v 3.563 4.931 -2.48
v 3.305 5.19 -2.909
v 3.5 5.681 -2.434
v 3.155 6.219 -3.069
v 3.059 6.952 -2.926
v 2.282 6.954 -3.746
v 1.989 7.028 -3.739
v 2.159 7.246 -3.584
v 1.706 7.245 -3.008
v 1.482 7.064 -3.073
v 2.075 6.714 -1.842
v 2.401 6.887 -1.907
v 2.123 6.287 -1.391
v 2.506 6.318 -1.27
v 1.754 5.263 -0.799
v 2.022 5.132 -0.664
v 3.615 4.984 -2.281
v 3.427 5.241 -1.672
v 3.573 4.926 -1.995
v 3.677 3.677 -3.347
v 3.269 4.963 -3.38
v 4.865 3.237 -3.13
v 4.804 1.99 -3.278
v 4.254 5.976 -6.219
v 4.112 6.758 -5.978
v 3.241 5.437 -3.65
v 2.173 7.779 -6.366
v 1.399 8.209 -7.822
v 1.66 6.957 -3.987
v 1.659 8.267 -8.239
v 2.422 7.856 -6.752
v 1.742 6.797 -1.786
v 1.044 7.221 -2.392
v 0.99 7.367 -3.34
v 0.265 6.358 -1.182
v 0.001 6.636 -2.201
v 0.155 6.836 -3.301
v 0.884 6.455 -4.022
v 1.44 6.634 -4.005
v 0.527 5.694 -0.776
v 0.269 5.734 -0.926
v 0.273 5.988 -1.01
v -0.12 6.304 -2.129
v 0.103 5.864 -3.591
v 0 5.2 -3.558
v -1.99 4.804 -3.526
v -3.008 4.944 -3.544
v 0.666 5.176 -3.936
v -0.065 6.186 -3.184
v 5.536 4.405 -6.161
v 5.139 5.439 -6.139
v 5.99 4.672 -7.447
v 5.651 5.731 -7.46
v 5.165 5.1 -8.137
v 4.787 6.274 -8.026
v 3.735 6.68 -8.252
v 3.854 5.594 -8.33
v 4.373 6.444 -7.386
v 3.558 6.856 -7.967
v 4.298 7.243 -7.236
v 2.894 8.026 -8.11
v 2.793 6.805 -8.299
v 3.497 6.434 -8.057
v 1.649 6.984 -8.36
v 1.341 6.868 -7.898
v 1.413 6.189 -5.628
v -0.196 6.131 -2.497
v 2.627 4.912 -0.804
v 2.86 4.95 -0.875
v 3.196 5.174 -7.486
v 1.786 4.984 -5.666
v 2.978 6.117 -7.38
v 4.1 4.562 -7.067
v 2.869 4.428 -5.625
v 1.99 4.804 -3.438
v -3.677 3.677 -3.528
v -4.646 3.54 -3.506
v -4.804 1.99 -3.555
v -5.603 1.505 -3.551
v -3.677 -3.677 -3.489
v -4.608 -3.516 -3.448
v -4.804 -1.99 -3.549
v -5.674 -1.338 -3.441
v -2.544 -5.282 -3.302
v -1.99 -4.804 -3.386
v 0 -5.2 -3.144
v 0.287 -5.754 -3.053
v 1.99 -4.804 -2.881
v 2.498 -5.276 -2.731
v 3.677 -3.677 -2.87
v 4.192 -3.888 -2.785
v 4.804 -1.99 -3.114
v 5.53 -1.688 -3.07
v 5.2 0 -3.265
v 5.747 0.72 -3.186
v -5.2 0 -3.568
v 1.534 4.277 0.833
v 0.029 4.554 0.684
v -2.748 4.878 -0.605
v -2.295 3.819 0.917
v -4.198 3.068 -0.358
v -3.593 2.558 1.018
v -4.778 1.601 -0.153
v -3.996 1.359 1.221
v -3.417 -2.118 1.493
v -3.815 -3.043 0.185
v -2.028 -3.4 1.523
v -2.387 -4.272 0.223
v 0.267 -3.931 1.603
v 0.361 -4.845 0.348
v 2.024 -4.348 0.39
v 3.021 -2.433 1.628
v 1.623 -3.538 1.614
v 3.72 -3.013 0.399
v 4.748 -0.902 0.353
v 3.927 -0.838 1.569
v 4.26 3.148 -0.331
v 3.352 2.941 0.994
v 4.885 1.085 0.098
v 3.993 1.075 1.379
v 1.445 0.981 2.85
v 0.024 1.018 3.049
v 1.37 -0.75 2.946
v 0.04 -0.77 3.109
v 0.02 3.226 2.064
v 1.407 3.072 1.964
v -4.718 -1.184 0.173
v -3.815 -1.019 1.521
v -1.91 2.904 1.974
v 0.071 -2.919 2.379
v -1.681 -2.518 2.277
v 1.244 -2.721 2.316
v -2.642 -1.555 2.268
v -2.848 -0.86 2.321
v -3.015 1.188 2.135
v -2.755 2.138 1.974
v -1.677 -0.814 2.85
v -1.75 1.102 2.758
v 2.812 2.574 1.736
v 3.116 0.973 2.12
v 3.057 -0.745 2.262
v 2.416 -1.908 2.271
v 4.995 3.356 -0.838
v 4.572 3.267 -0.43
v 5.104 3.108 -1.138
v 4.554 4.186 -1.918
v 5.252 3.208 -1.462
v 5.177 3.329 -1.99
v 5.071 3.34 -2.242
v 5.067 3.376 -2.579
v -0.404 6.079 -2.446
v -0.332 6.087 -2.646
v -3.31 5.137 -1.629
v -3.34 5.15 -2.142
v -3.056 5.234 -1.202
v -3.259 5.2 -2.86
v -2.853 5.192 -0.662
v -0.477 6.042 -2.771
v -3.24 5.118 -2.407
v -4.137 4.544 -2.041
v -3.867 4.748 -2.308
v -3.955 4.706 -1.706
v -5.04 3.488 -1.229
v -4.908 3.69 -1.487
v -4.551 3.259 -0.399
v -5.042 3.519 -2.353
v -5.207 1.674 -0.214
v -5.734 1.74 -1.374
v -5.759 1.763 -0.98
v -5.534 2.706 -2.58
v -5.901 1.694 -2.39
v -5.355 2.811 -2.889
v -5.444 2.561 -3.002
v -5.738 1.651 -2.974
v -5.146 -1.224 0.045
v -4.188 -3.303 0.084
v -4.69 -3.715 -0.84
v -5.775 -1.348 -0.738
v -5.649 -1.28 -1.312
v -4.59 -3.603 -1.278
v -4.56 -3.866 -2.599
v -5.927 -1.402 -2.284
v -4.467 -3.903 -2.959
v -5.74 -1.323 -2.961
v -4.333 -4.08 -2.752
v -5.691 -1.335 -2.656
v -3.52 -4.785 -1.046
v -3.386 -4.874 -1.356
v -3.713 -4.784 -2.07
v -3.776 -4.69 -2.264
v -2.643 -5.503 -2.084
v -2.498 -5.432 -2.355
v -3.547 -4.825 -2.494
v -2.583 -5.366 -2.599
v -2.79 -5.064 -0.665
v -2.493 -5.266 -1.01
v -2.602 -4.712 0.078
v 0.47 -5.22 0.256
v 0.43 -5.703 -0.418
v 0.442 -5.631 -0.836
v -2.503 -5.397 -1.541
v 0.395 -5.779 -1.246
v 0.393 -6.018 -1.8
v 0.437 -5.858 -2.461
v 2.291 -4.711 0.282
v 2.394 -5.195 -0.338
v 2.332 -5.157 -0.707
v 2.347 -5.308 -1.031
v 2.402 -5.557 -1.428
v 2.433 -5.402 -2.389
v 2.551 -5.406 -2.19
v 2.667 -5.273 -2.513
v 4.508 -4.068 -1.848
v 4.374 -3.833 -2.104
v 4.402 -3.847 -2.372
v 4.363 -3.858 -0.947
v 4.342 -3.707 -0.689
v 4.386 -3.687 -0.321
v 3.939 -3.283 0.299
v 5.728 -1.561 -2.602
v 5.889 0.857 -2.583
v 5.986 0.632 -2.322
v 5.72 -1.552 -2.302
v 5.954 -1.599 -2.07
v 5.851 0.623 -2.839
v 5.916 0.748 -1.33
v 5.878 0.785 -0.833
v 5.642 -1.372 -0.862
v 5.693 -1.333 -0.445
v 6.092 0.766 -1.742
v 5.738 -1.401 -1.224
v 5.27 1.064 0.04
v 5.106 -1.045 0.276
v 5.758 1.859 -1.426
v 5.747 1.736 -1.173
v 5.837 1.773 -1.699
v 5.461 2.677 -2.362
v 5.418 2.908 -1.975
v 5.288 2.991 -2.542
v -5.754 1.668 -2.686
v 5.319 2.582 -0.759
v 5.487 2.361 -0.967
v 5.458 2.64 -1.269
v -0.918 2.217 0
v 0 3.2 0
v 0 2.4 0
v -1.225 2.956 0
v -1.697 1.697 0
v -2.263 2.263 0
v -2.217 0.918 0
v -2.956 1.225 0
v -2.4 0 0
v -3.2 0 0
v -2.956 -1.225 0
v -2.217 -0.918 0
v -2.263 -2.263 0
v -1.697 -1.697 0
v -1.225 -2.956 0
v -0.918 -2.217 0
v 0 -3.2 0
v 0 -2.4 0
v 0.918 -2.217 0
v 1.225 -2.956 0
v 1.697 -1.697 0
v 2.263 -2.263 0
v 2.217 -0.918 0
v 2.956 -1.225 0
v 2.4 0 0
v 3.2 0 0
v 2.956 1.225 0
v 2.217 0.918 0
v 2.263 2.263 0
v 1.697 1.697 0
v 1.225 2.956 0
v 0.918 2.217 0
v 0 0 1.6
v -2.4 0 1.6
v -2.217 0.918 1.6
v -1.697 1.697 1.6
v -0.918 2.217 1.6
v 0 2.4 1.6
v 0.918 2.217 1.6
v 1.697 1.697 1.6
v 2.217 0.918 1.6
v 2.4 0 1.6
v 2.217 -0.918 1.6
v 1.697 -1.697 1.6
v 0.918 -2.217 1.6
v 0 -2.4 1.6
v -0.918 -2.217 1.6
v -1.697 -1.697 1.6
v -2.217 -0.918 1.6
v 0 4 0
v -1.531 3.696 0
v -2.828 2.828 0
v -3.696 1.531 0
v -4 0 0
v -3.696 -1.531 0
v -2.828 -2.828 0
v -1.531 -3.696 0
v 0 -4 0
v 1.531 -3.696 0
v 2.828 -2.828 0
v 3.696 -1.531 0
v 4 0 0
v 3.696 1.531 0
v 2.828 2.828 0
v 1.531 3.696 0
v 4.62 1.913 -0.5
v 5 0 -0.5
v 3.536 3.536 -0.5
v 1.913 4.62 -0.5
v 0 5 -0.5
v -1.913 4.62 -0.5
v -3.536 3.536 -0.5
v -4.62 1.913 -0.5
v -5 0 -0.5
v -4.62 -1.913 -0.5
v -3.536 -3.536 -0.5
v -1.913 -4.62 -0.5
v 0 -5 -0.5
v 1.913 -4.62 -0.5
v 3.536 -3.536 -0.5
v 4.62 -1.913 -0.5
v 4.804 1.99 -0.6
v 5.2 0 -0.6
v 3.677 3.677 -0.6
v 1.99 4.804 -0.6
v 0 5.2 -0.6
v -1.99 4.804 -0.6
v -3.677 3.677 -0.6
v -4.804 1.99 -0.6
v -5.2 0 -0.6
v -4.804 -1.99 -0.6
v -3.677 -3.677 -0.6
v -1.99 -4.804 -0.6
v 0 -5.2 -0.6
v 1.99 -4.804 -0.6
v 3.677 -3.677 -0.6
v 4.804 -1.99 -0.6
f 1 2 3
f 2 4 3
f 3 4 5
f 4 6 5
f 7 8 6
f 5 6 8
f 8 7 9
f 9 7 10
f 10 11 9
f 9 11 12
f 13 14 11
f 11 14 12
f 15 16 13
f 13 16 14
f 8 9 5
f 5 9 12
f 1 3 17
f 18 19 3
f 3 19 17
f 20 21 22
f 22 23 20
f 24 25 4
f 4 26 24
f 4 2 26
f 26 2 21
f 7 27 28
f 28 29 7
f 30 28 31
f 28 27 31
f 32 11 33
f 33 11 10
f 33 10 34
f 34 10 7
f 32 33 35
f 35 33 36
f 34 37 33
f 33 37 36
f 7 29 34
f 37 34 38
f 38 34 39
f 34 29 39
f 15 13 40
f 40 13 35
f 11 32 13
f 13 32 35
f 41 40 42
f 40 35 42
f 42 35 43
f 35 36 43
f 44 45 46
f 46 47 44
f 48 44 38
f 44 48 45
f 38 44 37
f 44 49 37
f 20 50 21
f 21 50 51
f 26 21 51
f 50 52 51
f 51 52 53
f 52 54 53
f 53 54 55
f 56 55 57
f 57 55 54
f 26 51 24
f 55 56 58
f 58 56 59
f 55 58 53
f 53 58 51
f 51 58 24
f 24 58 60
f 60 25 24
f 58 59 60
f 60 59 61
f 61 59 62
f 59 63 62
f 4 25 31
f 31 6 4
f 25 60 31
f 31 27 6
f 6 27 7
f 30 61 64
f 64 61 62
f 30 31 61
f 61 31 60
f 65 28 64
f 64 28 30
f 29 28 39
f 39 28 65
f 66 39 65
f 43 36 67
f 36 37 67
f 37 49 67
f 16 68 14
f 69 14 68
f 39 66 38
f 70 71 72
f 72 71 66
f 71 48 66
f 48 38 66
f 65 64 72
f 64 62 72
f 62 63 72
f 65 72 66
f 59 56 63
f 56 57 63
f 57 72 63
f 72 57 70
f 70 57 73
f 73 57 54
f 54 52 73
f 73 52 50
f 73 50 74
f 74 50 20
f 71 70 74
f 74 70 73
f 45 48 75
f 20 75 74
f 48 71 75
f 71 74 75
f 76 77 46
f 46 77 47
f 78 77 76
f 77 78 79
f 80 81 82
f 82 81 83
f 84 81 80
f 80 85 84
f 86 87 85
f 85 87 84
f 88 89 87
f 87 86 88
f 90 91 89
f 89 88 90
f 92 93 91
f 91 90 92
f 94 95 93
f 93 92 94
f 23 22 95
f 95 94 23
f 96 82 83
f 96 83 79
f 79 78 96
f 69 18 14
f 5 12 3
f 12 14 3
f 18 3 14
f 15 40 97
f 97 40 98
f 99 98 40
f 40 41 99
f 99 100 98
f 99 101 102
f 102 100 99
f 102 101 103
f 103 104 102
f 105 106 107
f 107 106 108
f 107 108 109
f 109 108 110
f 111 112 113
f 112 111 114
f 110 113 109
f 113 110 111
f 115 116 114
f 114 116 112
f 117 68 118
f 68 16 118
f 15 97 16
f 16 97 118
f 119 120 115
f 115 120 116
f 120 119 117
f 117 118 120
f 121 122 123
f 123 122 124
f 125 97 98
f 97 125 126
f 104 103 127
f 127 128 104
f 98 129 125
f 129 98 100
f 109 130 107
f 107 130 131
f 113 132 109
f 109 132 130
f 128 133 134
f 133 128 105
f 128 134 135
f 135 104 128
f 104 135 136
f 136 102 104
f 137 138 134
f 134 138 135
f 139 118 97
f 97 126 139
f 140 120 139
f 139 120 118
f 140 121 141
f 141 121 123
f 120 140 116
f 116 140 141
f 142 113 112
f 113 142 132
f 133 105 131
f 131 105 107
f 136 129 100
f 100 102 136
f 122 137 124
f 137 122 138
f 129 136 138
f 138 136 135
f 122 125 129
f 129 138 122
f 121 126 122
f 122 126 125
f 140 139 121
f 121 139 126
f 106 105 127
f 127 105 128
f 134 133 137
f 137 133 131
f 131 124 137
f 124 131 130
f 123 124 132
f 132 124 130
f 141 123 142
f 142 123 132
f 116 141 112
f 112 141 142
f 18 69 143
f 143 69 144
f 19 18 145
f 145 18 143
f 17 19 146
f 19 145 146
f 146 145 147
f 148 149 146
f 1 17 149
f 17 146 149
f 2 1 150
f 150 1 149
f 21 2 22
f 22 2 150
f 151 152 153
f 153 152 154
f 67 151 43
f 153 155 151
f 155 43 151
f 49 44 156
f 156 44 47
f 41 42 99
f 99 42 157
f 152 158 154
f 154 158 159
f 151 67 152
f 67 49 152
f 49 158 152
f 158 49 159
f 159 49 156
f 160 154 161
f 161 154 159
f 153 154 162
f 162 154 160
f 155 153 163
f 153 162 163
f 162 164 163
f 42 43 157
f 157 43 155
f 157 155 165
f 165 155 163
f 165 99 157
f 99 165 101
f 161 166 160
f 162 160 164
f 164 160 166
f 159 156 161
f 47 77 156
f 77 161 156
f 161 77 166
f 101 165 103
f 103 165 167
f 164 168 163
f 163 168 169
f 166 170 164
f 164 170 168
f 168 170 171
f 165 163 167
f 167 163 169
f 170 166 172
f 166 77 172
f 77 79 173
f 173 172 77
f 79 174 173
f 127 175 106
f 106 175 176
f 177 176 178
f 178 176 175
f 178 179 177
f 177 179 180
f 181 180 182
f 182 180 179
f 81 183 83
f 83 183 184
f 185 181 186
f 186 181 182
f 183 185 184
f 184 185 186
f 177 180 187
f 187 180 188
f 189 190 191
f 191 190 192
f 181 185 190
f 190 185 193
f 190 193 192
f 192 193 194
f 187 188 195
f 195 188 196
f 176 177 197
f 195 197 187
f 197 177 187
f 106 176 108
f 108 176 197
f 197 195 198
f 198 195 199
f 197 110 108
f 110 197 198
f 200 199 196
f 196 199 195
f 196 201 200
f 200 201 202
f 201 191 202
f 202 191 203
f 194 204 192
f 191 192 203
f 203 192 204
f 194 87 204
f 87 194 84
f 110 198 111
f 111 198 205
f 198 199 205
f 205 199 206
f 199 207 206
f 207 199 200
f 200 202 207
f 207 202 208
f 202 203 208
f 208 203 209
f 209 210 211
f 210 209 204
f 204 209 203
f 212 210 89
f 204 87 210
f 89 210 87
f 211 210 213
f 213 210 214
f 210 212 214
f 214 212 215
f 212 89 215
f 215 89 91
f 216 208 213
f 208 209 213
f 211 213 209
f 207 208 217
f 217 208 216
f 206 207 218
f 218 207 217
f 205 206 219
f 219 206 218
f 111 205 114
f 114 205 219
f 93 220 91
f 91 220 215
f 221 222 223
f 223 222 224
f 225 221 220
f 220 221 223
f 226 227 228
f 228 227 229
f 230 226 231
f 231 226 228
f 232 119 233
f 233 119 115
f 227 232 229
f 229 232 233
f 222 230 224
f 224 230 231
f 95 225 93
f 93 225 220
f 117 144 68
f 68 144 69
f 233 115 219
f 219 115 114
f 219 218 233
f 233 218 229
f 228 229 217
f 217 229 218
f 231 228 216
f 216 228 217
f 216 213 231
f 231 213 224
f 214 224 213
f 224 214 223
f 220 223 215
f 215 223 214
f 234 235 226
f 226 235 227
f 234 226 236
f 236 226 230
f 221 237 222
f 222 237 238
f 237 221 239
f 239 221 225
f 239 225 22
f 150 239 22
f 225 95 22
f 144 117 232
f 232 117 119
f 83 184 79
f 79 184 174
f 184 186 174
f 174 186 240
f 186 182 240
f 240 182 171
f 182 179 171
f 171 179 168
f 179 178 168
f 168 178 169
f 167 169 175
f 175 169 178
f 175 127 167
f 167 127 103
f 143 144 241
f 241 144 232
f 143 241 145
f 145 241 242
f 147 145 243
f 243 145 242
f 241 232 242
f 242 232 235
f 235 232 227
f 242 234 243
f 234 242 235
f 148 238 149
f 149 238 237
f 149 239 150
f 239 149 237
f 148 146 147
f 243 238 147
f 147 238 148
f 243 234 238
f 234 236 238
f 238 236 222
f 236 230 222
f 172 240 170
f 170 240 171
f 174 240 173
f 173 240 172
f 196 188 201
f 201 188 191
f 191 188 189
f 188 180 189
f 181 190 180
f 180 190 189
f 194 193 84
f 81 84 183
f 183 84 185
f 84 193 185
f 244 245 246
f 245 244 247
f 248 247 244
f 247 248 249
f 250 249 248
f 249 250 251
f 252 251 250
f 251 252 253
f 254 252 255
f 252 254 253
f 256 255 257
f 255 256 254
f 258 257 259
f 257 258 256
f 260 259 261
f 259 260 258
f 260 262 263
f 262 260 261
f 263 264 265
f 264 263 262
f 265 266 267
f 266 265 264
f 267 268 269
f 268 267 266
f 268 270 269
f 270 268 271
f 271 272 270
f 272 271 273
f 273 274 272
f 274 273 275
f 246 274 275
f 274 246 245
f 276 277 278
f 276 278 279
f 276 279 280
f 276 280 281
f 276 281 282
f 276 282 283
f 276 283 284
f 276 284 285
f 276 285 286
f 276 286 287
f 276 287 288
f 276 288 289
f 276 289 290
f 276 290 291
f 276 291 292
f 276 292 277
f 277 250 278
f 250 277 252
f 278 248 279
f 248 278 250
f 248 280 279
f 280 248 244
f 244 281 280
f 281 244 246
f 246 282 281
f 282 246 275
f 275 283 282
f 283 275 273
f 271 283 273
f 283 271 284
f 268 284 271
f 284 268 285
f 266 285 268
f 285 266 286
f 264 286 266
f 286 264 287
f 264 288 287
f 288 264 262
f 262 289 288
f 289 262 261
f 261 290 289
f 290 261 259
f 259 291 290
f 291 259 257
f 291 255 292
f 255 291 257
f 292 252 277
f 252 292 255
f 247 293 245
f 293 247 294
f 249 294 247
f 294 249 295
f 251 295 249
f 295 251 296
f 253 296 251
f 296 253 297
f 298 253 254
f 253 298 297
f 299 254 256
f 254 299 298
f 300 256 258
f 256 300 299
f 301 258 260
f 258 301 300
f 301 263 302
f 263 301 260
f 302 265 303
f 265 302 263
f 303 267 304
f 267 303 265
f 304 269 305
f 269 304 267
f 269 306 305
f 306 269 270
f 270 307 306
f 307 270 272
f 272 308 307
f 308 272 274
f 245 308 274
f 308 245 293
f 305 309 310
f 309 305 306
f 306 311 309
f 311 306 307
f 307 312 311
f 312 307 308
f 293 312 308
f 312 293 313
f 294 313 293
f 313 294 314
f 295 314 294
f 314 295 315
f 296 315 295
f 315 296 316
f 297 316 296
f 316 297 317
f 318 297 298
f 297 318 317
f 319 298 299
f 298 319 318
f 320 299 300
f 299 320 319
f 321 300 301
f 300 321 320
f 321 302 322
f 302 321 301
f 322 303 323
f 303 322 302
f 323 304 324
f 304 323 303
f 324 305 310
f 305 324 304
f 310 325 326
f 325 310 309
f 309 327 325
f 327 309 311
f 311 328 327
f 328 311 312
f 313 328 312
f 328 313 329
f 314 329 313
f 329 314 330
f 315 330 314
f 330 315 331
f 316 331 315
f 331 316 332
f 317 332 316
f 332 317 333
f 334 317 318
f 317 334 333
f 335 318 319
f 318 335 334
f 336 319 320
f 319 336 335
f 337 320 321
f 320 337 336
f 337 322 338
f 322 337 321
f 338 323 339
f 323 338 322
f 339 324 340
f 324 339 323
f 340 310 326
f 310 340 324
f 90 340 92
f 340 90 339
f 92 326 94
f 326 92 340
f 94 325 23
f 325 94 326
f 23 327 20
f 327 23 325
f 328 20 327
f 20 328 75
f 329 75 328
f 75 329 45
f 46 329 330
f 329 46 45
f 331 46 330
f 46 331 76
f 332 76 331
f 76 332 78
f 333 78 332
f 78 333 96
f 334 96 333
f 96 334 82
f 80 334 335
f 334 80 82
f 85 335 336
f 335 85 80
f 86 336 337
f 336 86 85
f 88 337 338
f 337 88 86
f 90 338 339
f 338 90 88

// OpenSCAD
use <../lib.scad>
use <s/25973s01.scad>
use <s/25973s02.scad>
use <s/25973s03.scad>
use <s/25973s04.scad>
function ldraw_lib__25973() = [
// 0 Minifig Headdress Bald Head with Tied Bandana
// 0 Name: 25973.dat
// 0 Author: Lisa Winter [LisaWinter]
// 0 !LDRAW_ORG Part UPDATE 2026-04
// 0 !LICENSE Licensed under CC BY 4.0 : see CAreadme.txt
// 
// 0 BFC CERTIFY CCW
  [0,"BFC","CERTIFY"],
  [0,"BFC","CCW"],
// 
// 0 !CATEGORY Minifig Headwear
// 
// 0 !HISTORY 2016-10-05 {LEGO Digital Designer} Original part shape
// 0 !HISTORY 2024-12-07 [LisaWinter] File preparation for LDraw Parts Tracker
// 0 !HISTORY 2026-04-27 [OrionP] Official Update 2026-04
// 
// 0 // Bandana
// 1 16 0 0 0 1 0 0 0 1 0 0 0 1 s\25973s01.dat
  [1,16,0,0,0,1,0,0,0,1,0,0,0,1, ldraw_lib__s__25973s01()],
// 
// 0 // Bald head
// 1 16 0 0 0 1 0 0 0 1 0 0 0 1 s\25973s02.dat
  [1,16,0,0,0,1,0,0,0,1,0,0,0,1, ldraw_lib__s__25973s02()],
// 
// 0 // Patternable area
// 1 16 0 0 0 1 0 0 0 1 0 0 0 1 s\25973s03.dat
  [1,16,0,0,0,1,0,0,0,1,0,0,0,1, ldraw_lib__s__25973s03()],
// 
// 0 // Inside
// 1 16 0 0 0 1 0 0 0 1 0 0 0 1 s\25973s04.dat
  [1,16,0,0,0,1,0,0,0,1,0,0,0,1, ldraw_lib__s__25973s04()],
];
module ldraw_lib__25973(step=0, col=false, unit=2/5, alt=false, line=0.2, solid=!$preview)
    makepoly(ldraw_lib__25973(), step=step, col=col, unit=unit, alt=alt, line=line, solid=solid);
ldraw_lib__25973(line=0.2);
